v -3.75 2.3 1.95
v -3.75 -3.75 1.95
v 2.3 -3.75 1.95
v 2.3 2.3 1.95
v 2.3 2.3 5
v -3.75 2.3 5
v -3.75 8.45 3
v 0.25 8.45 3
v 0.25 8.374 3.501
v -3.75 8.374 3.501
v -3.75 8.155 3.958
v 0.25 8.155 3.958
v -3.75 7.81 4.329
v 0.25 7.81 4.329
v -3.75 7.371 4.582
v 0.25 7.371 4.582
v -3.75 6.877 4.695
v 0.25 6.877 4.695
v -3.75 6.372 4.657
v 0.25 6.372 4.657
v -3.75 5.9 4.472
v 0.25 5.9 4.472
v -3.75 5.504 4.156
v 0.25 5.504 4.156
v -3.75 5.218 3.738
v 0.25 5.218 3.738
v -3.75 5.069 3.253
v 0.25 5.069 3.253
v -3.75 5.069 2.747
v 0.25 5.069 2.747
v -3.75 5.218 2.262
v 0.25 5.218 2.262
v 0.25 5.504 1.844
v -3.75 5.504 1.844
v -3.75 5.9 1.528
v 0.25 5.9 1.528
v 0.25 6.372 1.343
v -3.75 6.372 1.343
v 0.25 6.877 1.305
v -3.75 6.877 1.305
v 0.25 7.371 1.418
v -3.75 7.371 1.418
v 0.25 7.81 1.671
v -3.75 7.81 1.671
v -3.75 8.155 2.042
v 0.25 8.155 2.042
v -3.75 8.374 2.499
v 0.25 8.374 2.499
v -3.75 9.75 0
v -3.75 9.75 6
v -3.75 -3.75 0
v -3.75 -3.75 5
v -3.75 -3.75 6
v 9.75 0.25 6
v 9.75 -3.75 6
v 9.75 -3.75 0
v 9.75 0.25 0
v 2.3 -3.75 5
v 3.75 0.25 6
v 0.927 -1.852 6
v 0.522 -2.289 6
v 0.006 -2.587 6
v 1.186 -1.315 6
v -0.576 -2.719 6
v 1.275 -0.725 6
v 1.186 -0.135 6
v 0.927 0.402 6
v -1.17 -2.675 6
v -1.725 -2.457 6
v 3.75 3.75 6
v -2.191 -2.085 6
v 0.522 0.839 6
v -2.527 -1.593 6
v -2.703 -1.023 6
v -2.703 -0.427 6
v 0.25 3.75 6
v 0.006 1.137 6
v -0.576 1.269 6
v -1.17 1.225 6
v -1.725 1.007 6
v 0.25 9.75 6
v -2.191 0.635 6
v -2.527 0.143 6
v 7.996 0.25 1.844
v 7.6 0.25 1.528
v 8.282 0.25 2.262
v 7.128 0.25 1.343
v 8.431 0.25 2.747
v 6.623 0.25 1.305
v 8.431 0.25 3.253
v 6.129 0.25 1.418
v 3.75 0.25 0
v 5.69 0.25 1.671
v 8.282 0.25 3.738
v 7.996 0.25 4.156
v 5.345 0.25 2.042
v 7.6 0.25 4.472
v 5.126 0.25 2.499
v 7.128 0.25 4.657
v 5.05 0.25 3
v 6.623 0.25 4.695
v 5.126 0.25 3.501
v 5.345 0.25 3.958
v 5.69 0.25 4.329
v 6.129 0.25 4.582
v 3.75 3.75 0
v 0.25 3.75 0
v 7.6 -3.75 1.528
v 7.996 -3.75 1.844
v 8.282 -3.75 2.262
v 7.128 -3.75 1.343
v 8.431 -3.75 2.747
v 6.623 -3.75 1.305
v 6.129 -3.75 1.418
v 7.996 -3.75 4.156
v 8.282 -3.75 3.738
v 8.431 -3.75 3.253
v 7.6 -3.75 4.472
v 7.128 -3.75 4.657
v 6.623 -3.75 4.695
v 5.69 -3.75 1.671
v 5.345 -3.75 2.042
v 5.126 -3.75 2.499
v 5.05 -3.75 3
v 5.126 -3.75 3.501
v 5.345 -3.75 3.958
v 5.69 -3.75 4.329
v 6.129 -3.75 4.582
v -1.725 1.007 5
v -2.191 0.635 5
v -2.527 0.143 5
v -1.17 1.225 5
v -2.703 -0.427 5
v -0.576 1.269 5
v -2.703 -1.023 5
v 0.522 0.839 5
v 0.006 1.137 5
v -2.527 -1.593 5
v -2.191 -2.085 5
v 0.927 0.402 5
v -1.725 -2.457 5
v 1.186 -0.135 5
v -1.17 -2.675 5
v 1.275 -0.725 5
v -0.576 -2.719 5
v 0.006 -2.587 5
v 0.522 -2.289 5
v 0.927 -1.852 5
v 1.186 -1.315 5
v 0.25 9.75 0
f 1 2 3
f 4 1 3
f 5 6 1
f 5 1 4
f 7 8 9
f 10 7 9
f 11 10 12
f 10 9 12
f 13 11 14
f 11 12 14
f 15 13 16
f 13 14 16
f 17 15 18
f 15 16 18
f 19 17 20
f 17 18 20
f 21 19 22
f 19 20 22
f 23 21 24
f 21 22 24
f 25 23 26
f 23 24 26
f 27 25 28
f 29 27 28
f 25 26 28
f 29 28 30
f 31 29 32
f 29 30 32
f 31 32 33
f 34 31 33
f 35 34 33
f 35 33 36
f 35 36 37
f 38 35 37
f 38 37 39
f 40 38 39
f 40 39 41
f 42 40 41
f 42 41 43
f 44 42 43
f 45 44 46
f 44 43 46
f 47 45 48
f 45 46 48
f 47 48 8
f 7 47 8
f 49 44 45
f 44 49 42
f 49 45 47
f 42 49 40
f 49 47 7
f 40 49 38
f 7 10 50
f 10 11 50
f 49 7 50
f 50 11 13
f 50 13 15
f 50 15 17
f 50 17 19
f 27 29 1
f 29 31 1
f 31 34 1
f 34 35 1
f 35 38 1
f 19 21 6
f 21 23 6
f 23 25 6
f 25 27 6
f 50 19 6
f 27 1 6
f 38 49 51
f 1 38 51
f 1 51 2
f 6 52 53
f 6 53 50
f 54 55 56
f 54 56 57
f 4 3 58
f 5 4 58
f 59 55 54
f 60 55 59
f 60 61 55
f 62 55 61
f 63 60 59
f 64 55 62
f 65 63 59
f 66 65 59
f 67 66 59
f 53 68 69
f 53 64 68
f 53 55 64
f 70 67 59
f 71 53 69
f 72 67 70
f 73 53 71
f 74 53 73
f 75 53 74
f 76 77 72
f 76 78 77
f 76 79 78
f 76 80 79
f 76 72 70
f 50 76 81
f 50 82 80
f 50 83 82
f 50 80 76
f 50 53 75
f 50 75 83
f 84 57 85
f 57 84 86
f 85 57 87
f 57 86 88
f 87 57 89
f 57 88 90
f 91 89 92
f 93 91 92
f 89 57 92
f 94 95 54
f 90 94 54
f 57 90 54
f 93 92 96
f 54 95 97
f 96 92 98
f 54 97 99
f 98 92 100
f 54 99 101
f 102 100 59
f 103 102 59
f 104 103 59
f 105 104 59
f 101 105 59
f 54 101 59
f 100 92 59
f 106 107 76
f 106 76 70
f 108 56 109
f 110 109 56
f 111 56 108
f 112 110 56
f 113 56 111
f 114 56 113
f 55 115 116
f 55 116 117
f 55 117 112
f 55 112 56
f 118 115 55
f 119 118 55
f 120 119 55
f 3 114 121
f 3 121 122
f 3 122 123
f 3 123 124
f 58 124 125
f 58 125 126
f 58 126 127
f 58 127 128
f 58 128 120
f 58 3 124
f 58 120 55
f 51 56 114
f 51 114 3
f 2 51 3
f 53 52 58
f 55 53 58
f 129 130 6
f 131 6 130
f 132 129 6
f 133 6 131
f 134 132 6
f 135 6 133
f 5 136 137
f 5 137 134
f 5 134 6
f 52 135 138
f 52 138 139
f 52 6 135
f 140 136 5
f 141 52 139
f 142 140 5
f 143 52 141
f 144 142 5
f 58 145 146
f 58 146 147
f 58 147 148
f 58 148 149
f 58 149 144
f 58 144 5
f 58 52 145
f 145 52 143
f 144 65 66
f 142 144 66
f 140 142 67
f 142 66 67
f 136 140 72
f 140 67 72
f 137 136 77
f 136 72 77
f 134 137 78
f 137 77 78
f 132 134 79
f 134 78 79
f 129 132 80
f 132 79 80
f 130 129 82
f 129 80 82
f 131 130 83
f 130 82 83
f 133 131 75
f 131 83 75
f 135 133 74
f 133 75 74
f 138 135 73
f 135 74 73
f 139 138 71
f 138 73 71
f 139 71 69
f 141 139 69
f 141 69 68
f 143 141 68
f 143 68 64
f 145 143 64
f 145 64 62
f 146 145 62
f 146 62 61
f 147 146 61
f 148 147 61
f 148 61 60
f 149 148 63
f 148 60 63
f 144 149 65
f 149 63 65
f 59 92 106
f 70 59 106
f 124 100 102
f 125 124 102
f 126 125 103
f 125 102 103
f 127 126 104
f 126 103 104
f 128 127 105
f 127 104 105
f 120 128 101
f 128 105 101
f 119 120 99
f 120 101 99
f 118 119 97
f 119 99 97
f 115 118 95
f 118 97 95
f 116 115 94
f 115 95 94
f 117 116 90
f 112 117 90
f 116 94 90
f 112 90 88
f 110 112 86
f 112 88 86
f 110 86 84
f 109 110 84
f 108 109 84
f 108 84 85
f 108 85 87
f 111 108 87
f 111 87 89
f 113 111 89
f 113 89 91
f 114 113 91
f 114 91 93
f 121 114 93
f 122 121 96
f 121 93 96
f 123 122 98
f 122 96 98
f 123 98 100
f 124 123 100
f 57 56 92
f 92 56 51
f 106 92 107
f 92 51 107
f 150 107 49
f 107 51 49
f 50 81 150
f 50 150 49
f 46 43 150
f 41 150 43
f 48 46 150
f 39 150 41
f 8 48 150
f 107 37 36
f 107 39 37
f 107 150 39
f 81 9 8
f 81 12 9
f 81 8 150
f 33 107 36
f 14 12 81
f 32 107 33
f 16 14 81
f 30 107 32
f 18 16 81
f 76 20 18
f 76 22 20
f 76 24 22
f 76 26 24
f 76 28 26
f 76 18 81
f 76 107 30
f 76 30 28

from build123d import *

# Parameters (mm, degrees)
SKETCH_W        = 7.5
SKETCH_H        = 7.5
PAD_DEPTH       = 6
SKETCH001_W     = 4
SKETCH001_H     = 6
PAD001_DEPTH    = 6
SKETCH002_W     = 4
SKETCH002_H     = 6
PAD002_DEPTH    = 6
SKETCH003_R     = 1.7
HOLE_DEPTH      = 4
HOLE_TIPS_R     = 1.7
SKETCH004_R     = 1.7
HOLE001_DEPTH   = 4
HOLE001_TIPS_R  = 1.7
SKETCH005_W     = 6.05
SKETCH005_H     = 3.05
POCKET_DEPTH    = 6.05
SKETCH006_R     = 2
POCKET001_DEPTH = 1


with BuildPart() as part:
    # Sketch → Pad (new body)
    with BuildSketch(Plane.XY):
        Rectangle(SKETCH_W, SKETCH_H)
    extrude(amount=PAD_DEPTH)

    # Sketch001 (on Face2 of Pad) → Pad001 (join)
    with BuildSketch(Plane(origin=(0, 3.75, 0), x_dir=(-1, 0, 0), z_dir=(0, 1, 0))):
        with Locations((1.75, 3)):
            Rectangle(SKETCH001_W, SKETCH001_H)
    extrude(amount=PAD001_DEPTH)

    # Sketch002 (on Face2 of Pad001) → Pad002 (join)
    with BuildSketch(Plane.YZ.offset(3.75)):
        with Locations((-1.75, 3)):
            Rectangle(SKETCH002_W, SKETCH002_H)
    extrude(amount=PAD002_DEPTH)

    # Sketch003 (on Face6 of Pad002) → Hole (cut)
    with BuildSketch(Plane(origin=(0, 0.25, 0), x_dir=(-1, 0, 0), z_dir=(0, 1, 0))):
        with Locations((-6.75, 3)):
            Circle(SKETCH003_R)
    extrude(amount=-HOLE_DEPTH, mode=Mode.SUBTRACT)

    # Hole tips → Hole tip 1 section 0
    with BuildSketch(Plane(origin=(0, -3.75, 0), x_dir=(-1, 0, 0), z_dir=(0, 1, 0)), mode=Mode.PRIVATE) as hole_tip_1_s0:
        with Locations((-6.75, 3)):
            Circle(HOLE_TIPS_R)
    loft([hole_tip_1_s0.sketch, Vertex(6.75, -4.771463, 3)], mode=Mode.SUBTRACT)

    # Sketch004 (on Face11 of Hole) → Hole001 (cut)
    with BuildSketch(Plane.YZ.offset(0.25)):
        with Locations((6.75, 3)):
            Circle(SKETCH004_R)
    extrude(amount=-HOLE001_DEPTH, mode=Mode.SUBTRACT)

    # Hole001 tips → Hole001 tip 1 section 0
    with BuildSketch(Plane.YZ.offset(-3.75), mode=Mode.PRIVATE) as hole001_tip_1_s0:
        with Locations((6.75, 3)):
            Circle(HOLE001_TIPS_R)
    loft([hole001_tip_1_s0.sketch, Vertex(-4.771463, 6.75, 3)], mode=Mode.SUBTRACT)

    # Sketch005 (on Face2 of Hole001) → Pocket (cut)
    with BuildSketch(Plane.XZ.offset(3.75)):
        with Locations((-0.725, 3.475)):
            Rectangle(SKETCH005_W, SKETCH005_H)
    extrude(amount=-POCKET_DEPTH, mode=Mode.SUBTRACT)

    # Sketch006 (on Face4 of Pocket) → Pocket001 (cut)
    with BuildSketch(Plane.XY.offset(6)):
        with Locations((-0.725, -0.725)):
            Circle(SKETCH006_R)
    extrude(amount=-POCKET001_DEPTH, mode=Mode.SUBTRACT)


solid = part.part
